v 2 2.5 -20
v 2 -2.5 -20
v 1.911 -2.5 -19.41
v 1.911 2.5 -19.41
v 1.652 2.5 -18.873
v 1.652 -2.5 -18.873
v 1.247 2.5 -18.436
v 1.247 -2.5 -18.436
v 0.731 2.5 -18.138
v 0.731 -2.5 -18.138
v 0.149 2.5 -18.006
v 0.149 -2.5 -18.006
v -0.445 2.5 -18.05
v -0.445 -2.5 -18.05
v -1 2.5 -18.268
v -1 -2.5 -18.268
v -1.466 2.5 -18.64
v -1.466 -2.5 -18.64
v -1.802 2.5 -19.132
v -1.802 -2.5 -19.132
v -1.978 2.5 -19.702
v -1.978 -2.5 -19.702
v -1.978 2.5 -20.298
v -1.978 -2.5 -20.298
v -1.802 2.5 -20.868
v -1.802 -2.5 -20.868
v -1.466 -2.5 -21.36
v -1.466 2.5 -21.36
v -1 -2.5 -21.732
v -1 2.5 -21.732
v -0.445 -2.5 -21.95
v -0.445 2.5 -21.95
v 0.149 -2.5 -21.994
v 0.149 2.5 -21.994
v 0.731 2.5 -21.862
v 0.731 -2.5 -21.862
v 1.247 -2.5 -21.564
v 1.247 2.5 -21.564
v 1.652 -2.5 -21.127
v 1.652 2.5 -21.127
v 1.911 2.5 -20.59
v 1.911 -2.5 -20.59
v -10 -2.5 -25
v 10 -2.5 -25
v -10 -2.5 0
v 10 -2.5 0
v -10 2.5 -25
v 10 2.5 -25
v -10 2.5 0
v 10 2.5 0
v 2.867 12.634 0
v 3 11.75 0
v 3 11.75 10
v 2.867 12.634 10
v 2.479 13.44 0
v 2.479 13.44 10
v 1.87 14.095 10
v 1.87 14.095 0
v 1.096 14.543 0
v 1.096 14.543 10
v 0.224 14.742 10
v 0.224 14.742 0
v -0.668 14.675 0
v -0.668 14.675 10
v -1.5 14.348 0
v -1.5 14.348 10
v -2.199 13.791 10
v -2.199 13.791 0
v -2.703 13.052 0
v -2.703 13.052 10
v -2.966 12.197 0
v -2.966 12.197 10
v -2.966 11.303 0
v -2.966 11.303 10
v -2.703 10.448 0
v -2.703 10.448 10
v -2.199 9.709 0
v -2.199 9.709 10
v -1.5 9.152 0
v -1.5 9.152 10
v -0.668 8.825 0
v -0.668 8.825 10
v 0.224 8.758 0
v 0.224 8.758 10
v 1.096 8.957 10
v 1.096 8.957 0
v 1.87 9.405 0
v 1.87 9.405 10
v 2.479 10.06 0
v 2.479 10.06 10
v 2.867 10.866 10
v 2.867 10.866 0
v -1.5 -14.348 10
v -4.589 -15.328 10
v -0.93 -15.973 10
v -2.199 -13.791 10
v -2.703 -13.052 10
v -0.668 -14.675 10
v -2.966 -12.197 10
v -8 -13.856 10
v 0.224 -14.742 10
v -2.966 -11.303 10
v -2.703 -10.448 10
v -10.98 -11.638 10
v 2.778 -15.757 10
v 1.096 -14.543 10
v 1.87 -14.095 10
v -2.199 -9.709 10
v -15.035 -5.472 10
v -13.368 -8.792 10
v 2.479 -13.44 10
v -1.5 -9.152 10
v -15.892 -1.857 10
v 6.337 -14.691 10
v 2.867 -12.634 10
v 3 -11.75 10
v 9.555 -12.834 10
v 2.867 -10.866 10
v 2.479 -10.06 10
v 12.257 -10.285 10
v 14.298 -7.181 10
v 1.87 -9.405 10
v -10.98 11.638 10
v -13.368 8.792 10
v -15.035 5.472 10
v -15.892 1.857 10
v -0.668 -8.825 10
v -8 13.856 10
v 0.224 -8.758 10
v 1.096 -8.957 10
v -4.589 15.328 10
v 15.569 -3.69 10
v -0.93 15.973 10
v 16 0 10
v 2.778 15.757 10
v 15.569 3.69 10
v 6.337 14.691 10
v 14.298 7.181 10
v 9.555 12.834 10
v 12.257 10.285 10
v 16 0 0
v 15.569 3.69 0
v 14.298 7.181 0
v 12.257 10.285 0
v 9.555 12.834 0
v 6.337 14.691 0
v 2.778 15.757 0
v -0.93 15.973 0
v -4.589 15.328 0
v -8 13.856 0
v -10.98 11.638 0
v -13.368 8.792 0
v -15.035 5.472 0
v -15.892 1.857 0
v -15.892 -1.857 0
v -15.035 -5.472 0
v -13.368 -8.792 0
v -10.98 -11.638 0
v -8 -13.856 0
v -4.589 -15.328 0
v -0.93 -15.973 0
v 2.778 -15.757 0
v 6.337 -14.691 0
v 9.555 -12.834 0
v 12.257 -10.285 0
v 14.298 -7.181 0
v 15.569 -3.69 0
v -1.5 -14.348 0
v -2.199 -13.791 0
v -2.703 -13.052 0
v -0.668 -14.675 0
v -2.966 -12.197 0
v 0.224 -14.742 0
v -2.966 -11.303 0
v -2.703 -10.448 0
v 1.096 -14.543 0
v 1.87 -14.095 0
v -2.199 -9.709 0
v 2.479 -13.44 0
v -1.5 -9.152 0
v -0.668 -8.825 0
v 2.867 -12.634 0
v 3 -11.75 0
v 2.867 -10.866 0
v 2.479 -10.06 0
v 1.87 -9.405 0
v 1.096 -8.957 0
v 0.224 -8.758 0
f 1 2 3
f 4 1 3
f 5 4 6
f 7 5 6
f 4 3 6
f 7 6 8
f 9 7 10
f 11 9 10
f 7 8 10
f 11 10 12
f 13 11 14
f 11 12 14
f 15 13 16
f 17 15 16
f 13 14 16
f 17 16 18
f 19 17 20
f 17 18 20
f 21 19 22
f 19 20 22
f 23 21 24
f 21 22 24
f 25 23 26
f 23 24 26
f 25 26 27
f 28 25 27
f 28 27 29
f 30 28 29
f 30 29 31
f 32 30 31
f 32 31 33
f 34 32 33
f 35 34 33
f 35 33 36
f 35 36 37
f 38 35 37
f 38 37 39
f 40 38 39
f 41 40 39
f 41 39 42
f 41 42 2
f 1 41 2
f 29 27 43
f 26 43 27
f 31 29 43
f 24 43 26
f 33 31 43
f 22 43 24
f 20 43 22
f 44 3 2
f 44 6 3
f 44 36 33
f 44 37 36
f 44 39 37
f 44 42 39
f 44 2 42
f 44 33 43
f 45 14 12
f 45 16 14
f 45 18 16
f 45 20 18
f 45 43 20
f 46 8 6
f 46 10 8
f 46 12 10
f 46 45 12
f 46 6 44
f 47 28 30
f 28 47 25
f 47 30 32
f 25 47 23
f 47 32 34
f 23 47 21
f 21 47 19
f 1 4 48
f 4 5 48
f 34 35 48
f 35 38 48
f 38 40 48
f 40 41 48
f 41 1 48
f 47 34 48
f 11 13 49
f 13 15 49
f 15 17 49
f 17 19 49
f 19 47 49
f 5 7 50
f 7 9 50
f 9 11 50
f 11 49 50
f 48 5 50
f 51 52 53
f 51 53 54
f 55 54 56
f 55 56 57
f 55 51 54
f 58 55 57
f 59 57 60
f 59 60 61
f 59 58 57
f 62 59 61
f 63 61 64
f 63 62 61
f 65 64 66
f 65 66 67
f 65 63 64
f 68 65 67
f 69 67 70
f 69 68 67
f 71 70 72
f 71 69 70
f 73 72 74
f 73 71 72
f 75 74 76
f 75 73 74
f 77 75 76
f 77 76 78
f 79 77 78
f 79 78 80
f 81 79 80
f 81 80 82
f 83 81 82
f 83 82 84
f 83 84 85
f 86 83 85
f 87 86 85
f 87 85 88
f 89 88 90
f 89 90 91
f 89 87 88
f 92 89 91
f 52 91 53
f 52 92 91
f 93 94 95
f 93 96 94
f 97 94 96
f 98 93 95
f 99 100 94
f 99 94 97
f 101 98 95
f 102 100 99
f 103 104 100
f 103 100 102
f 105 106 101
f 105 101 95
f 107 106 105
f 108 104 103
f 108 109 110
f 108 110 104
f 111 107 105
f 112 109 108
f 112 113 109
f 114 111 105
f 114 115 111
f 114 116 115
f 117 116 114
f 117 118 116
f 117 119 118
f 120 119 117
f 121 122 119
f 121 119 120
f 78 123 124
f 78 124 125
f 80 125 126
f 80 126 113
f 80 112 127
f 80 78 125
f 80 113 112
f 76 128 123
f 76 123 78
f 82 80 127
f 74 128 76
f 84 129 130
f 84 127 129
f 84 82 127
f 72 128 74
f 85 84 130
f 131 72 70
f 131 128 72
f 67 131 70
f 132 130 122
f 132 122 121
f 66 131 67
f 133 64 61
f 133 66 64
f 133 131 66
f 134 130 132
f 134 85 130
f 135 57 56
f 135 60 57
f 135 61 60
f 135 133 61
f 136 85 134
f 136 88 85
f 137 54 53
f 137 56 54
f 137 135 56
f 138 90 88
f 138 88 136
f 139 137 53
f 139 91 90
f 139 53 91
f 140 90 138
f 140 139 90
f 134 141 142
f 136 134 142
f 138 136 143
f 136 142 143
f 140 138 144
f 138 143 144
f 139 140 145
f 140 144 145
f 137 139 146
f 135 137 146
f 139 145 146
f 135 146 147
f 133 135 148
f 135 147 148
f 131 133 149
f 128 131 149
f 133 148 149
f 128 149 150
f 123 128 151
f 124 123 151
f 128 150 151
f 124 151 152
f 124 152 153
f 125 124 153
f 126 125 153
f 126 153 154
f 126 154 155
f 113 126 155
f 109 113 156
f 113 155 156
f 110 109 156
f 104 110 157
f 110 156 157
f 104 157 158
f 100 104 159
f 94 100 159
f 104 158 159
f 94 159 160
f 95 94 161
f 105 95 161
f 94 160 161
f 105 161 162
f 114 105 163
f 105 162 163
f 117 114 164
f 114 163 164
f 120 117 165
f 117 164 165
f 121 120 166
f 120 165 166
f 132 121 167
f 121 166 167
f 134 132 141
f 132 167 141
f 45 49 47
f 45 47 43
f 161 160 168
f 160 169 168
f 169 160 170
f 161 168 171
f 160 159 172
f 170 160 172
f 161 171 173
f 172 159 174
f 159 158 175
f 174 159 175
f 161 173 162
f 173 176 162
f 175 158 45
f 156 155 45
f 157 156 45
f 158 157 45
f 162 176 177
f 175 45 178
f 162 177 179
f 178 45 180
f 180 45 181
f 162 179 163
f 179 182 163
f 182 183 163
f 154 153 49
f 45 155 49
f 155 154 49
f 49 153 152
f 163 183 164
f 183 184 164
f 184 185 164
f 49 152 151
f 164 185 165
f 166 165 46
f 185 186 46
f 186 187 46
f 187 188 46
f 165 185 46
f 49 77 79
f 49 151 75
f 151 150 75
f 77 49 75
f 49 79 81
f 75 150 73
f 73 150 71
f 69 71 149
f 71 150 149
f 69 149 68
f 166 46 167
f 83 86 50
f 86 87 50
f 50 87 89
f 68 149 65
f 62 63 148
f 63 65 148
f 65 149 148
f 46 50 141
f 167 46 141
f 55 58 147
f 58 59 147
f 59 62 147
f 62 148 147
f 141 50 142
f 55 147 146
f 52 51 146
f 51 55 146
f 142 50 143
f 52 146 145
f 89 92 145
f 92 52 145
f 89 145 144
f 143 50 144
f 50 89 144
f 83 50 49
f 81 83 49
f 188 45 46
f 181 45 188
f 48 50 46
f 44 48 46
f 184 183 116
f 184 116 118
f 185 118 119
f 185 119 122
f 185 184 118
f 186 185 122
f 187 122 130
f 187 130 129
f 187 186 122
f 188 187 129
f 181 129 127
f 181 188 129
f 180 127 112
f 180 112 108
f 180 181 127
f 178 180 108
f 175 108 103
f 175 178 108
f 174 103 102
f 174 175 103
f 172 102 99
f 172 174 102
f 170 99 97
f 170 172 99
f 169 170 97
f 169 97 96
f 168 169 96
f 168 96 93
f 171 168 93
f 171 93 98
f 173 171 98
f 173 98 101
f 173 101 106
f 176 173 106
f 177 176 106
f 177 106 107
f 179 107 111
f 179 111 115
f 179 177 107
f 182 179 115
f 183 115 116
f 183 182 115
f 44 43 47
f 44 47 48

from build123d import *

# Parameters (mm, degrees)
F0_R     = 16
F0_R_2   = 3
F1_DEPTH = 10
F2_W     = 20
F2_H     = 5
F3_DEPTH = 25
F5_D     = 4


with BuildPart() as f1:
    # F0 (on Top) → F1 (new body)
    with BuildSketch(Plane.XY):
        Circle(F0_R)
        with Locations((0, -11.75)):
            Circle(F0_R_2, mode=Mode.SUBTRACT)
        with Locations((0, 11.75)):
            Circle(F0_R_2, mode=Mode.SUBTRACT)
    extrude(amount=F1_DEPTH)

    # F2 (on face) → F3 (join)
    with BuildSketch(Plane(origin=(0, 0, 0), x_dir=(1, 0, 0), z_dir=(0, 0, -1))):
        Rectangle(F2_W, F2_H)
    extrude(amount=F3_DEPTH)

    # F5 (through all)
    with Locations(Plane(origin=(0, 2.5, 0), x_dir=(-1, 0, 0), z_dir=(0, 1, 0))):
        with Locations((0, -20)):
            Hole(F5_D / 2)


solid = f1.part
